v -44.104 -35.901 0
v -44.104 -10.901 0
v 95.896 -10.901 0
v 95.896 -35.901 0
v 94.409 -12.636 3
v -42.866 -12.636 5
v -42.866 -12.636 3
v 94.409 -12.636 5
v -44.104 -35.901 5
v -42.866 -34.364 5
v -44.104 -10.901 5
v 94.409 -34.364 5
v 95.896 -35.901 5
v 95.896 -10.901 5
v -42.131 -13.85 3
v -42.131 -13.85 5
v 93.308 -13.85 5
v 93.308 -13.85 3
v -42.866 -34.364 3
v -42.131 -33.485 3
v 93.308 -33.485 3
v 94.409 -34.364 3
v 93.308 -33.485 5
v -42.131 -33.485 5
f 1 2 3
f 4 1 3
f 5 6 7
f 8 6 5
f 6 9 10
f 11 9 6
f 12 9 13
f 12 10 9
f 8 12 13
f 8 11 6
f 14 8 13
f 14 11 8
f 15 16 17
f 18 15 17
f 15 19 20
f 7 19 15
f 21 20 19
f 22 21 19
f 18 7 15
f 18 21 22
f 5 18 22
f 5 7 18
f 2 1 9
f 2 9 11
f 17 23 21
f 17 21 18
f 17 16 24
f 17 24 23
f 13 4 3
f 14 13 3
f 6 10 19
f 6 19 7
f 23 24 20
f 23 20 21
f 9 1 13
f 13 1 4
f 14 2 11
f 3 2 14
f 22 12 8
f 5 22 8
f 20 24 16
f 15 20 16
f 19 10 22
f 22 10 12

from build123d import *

# Parameters (mm, degrees)
F0_W     = 140
F0_H     = 25
F1_DEPTH = 5
F2_W     = 137.275629
F2_H     = 21.727344
F4_DEPTH = 2
F3_W     = 137.275629
F3_H     = 21.727344
F3_W_2   = 135.43924
F3_H_2   = 19.634312
F5_DEPTH = 2


with BuildPart() as f1:
    # F0 (on Top) → F1 (new body)
    with BuildSketch(Plane.XY):
        with Locations((25.895725, -23.401141)):
            Rectangle(F0_W, F0_H)
    extrude(amount=F1_DEPTH)

    # F2 (on face) → F4 (cut)
    with BuildSketch(Plane.XY.offset(5)):
        with Locations((25.771517, -23.499948)):
            Rectangle(F2_W, F2_H)
    extrude(amount=F4_DEPTH, mode=Mode.SUBTRACT)

    # F3 (on face) → F5 (cut)
    with BuildSketch(Plane.XY.offset(5)):
        with Locations((25.771517, -23.499948)):
            Rectangle(F3_W, F3_H)
        with Locations((25.588829, -23.667381)):
            Rectangle(F3_W_2, F3_H_2, mode=Mode.SUBTRACT)
    extrude(amount=-F5_DEPTH, mode=Mode.SUBTRACT)


solid = f1.part
